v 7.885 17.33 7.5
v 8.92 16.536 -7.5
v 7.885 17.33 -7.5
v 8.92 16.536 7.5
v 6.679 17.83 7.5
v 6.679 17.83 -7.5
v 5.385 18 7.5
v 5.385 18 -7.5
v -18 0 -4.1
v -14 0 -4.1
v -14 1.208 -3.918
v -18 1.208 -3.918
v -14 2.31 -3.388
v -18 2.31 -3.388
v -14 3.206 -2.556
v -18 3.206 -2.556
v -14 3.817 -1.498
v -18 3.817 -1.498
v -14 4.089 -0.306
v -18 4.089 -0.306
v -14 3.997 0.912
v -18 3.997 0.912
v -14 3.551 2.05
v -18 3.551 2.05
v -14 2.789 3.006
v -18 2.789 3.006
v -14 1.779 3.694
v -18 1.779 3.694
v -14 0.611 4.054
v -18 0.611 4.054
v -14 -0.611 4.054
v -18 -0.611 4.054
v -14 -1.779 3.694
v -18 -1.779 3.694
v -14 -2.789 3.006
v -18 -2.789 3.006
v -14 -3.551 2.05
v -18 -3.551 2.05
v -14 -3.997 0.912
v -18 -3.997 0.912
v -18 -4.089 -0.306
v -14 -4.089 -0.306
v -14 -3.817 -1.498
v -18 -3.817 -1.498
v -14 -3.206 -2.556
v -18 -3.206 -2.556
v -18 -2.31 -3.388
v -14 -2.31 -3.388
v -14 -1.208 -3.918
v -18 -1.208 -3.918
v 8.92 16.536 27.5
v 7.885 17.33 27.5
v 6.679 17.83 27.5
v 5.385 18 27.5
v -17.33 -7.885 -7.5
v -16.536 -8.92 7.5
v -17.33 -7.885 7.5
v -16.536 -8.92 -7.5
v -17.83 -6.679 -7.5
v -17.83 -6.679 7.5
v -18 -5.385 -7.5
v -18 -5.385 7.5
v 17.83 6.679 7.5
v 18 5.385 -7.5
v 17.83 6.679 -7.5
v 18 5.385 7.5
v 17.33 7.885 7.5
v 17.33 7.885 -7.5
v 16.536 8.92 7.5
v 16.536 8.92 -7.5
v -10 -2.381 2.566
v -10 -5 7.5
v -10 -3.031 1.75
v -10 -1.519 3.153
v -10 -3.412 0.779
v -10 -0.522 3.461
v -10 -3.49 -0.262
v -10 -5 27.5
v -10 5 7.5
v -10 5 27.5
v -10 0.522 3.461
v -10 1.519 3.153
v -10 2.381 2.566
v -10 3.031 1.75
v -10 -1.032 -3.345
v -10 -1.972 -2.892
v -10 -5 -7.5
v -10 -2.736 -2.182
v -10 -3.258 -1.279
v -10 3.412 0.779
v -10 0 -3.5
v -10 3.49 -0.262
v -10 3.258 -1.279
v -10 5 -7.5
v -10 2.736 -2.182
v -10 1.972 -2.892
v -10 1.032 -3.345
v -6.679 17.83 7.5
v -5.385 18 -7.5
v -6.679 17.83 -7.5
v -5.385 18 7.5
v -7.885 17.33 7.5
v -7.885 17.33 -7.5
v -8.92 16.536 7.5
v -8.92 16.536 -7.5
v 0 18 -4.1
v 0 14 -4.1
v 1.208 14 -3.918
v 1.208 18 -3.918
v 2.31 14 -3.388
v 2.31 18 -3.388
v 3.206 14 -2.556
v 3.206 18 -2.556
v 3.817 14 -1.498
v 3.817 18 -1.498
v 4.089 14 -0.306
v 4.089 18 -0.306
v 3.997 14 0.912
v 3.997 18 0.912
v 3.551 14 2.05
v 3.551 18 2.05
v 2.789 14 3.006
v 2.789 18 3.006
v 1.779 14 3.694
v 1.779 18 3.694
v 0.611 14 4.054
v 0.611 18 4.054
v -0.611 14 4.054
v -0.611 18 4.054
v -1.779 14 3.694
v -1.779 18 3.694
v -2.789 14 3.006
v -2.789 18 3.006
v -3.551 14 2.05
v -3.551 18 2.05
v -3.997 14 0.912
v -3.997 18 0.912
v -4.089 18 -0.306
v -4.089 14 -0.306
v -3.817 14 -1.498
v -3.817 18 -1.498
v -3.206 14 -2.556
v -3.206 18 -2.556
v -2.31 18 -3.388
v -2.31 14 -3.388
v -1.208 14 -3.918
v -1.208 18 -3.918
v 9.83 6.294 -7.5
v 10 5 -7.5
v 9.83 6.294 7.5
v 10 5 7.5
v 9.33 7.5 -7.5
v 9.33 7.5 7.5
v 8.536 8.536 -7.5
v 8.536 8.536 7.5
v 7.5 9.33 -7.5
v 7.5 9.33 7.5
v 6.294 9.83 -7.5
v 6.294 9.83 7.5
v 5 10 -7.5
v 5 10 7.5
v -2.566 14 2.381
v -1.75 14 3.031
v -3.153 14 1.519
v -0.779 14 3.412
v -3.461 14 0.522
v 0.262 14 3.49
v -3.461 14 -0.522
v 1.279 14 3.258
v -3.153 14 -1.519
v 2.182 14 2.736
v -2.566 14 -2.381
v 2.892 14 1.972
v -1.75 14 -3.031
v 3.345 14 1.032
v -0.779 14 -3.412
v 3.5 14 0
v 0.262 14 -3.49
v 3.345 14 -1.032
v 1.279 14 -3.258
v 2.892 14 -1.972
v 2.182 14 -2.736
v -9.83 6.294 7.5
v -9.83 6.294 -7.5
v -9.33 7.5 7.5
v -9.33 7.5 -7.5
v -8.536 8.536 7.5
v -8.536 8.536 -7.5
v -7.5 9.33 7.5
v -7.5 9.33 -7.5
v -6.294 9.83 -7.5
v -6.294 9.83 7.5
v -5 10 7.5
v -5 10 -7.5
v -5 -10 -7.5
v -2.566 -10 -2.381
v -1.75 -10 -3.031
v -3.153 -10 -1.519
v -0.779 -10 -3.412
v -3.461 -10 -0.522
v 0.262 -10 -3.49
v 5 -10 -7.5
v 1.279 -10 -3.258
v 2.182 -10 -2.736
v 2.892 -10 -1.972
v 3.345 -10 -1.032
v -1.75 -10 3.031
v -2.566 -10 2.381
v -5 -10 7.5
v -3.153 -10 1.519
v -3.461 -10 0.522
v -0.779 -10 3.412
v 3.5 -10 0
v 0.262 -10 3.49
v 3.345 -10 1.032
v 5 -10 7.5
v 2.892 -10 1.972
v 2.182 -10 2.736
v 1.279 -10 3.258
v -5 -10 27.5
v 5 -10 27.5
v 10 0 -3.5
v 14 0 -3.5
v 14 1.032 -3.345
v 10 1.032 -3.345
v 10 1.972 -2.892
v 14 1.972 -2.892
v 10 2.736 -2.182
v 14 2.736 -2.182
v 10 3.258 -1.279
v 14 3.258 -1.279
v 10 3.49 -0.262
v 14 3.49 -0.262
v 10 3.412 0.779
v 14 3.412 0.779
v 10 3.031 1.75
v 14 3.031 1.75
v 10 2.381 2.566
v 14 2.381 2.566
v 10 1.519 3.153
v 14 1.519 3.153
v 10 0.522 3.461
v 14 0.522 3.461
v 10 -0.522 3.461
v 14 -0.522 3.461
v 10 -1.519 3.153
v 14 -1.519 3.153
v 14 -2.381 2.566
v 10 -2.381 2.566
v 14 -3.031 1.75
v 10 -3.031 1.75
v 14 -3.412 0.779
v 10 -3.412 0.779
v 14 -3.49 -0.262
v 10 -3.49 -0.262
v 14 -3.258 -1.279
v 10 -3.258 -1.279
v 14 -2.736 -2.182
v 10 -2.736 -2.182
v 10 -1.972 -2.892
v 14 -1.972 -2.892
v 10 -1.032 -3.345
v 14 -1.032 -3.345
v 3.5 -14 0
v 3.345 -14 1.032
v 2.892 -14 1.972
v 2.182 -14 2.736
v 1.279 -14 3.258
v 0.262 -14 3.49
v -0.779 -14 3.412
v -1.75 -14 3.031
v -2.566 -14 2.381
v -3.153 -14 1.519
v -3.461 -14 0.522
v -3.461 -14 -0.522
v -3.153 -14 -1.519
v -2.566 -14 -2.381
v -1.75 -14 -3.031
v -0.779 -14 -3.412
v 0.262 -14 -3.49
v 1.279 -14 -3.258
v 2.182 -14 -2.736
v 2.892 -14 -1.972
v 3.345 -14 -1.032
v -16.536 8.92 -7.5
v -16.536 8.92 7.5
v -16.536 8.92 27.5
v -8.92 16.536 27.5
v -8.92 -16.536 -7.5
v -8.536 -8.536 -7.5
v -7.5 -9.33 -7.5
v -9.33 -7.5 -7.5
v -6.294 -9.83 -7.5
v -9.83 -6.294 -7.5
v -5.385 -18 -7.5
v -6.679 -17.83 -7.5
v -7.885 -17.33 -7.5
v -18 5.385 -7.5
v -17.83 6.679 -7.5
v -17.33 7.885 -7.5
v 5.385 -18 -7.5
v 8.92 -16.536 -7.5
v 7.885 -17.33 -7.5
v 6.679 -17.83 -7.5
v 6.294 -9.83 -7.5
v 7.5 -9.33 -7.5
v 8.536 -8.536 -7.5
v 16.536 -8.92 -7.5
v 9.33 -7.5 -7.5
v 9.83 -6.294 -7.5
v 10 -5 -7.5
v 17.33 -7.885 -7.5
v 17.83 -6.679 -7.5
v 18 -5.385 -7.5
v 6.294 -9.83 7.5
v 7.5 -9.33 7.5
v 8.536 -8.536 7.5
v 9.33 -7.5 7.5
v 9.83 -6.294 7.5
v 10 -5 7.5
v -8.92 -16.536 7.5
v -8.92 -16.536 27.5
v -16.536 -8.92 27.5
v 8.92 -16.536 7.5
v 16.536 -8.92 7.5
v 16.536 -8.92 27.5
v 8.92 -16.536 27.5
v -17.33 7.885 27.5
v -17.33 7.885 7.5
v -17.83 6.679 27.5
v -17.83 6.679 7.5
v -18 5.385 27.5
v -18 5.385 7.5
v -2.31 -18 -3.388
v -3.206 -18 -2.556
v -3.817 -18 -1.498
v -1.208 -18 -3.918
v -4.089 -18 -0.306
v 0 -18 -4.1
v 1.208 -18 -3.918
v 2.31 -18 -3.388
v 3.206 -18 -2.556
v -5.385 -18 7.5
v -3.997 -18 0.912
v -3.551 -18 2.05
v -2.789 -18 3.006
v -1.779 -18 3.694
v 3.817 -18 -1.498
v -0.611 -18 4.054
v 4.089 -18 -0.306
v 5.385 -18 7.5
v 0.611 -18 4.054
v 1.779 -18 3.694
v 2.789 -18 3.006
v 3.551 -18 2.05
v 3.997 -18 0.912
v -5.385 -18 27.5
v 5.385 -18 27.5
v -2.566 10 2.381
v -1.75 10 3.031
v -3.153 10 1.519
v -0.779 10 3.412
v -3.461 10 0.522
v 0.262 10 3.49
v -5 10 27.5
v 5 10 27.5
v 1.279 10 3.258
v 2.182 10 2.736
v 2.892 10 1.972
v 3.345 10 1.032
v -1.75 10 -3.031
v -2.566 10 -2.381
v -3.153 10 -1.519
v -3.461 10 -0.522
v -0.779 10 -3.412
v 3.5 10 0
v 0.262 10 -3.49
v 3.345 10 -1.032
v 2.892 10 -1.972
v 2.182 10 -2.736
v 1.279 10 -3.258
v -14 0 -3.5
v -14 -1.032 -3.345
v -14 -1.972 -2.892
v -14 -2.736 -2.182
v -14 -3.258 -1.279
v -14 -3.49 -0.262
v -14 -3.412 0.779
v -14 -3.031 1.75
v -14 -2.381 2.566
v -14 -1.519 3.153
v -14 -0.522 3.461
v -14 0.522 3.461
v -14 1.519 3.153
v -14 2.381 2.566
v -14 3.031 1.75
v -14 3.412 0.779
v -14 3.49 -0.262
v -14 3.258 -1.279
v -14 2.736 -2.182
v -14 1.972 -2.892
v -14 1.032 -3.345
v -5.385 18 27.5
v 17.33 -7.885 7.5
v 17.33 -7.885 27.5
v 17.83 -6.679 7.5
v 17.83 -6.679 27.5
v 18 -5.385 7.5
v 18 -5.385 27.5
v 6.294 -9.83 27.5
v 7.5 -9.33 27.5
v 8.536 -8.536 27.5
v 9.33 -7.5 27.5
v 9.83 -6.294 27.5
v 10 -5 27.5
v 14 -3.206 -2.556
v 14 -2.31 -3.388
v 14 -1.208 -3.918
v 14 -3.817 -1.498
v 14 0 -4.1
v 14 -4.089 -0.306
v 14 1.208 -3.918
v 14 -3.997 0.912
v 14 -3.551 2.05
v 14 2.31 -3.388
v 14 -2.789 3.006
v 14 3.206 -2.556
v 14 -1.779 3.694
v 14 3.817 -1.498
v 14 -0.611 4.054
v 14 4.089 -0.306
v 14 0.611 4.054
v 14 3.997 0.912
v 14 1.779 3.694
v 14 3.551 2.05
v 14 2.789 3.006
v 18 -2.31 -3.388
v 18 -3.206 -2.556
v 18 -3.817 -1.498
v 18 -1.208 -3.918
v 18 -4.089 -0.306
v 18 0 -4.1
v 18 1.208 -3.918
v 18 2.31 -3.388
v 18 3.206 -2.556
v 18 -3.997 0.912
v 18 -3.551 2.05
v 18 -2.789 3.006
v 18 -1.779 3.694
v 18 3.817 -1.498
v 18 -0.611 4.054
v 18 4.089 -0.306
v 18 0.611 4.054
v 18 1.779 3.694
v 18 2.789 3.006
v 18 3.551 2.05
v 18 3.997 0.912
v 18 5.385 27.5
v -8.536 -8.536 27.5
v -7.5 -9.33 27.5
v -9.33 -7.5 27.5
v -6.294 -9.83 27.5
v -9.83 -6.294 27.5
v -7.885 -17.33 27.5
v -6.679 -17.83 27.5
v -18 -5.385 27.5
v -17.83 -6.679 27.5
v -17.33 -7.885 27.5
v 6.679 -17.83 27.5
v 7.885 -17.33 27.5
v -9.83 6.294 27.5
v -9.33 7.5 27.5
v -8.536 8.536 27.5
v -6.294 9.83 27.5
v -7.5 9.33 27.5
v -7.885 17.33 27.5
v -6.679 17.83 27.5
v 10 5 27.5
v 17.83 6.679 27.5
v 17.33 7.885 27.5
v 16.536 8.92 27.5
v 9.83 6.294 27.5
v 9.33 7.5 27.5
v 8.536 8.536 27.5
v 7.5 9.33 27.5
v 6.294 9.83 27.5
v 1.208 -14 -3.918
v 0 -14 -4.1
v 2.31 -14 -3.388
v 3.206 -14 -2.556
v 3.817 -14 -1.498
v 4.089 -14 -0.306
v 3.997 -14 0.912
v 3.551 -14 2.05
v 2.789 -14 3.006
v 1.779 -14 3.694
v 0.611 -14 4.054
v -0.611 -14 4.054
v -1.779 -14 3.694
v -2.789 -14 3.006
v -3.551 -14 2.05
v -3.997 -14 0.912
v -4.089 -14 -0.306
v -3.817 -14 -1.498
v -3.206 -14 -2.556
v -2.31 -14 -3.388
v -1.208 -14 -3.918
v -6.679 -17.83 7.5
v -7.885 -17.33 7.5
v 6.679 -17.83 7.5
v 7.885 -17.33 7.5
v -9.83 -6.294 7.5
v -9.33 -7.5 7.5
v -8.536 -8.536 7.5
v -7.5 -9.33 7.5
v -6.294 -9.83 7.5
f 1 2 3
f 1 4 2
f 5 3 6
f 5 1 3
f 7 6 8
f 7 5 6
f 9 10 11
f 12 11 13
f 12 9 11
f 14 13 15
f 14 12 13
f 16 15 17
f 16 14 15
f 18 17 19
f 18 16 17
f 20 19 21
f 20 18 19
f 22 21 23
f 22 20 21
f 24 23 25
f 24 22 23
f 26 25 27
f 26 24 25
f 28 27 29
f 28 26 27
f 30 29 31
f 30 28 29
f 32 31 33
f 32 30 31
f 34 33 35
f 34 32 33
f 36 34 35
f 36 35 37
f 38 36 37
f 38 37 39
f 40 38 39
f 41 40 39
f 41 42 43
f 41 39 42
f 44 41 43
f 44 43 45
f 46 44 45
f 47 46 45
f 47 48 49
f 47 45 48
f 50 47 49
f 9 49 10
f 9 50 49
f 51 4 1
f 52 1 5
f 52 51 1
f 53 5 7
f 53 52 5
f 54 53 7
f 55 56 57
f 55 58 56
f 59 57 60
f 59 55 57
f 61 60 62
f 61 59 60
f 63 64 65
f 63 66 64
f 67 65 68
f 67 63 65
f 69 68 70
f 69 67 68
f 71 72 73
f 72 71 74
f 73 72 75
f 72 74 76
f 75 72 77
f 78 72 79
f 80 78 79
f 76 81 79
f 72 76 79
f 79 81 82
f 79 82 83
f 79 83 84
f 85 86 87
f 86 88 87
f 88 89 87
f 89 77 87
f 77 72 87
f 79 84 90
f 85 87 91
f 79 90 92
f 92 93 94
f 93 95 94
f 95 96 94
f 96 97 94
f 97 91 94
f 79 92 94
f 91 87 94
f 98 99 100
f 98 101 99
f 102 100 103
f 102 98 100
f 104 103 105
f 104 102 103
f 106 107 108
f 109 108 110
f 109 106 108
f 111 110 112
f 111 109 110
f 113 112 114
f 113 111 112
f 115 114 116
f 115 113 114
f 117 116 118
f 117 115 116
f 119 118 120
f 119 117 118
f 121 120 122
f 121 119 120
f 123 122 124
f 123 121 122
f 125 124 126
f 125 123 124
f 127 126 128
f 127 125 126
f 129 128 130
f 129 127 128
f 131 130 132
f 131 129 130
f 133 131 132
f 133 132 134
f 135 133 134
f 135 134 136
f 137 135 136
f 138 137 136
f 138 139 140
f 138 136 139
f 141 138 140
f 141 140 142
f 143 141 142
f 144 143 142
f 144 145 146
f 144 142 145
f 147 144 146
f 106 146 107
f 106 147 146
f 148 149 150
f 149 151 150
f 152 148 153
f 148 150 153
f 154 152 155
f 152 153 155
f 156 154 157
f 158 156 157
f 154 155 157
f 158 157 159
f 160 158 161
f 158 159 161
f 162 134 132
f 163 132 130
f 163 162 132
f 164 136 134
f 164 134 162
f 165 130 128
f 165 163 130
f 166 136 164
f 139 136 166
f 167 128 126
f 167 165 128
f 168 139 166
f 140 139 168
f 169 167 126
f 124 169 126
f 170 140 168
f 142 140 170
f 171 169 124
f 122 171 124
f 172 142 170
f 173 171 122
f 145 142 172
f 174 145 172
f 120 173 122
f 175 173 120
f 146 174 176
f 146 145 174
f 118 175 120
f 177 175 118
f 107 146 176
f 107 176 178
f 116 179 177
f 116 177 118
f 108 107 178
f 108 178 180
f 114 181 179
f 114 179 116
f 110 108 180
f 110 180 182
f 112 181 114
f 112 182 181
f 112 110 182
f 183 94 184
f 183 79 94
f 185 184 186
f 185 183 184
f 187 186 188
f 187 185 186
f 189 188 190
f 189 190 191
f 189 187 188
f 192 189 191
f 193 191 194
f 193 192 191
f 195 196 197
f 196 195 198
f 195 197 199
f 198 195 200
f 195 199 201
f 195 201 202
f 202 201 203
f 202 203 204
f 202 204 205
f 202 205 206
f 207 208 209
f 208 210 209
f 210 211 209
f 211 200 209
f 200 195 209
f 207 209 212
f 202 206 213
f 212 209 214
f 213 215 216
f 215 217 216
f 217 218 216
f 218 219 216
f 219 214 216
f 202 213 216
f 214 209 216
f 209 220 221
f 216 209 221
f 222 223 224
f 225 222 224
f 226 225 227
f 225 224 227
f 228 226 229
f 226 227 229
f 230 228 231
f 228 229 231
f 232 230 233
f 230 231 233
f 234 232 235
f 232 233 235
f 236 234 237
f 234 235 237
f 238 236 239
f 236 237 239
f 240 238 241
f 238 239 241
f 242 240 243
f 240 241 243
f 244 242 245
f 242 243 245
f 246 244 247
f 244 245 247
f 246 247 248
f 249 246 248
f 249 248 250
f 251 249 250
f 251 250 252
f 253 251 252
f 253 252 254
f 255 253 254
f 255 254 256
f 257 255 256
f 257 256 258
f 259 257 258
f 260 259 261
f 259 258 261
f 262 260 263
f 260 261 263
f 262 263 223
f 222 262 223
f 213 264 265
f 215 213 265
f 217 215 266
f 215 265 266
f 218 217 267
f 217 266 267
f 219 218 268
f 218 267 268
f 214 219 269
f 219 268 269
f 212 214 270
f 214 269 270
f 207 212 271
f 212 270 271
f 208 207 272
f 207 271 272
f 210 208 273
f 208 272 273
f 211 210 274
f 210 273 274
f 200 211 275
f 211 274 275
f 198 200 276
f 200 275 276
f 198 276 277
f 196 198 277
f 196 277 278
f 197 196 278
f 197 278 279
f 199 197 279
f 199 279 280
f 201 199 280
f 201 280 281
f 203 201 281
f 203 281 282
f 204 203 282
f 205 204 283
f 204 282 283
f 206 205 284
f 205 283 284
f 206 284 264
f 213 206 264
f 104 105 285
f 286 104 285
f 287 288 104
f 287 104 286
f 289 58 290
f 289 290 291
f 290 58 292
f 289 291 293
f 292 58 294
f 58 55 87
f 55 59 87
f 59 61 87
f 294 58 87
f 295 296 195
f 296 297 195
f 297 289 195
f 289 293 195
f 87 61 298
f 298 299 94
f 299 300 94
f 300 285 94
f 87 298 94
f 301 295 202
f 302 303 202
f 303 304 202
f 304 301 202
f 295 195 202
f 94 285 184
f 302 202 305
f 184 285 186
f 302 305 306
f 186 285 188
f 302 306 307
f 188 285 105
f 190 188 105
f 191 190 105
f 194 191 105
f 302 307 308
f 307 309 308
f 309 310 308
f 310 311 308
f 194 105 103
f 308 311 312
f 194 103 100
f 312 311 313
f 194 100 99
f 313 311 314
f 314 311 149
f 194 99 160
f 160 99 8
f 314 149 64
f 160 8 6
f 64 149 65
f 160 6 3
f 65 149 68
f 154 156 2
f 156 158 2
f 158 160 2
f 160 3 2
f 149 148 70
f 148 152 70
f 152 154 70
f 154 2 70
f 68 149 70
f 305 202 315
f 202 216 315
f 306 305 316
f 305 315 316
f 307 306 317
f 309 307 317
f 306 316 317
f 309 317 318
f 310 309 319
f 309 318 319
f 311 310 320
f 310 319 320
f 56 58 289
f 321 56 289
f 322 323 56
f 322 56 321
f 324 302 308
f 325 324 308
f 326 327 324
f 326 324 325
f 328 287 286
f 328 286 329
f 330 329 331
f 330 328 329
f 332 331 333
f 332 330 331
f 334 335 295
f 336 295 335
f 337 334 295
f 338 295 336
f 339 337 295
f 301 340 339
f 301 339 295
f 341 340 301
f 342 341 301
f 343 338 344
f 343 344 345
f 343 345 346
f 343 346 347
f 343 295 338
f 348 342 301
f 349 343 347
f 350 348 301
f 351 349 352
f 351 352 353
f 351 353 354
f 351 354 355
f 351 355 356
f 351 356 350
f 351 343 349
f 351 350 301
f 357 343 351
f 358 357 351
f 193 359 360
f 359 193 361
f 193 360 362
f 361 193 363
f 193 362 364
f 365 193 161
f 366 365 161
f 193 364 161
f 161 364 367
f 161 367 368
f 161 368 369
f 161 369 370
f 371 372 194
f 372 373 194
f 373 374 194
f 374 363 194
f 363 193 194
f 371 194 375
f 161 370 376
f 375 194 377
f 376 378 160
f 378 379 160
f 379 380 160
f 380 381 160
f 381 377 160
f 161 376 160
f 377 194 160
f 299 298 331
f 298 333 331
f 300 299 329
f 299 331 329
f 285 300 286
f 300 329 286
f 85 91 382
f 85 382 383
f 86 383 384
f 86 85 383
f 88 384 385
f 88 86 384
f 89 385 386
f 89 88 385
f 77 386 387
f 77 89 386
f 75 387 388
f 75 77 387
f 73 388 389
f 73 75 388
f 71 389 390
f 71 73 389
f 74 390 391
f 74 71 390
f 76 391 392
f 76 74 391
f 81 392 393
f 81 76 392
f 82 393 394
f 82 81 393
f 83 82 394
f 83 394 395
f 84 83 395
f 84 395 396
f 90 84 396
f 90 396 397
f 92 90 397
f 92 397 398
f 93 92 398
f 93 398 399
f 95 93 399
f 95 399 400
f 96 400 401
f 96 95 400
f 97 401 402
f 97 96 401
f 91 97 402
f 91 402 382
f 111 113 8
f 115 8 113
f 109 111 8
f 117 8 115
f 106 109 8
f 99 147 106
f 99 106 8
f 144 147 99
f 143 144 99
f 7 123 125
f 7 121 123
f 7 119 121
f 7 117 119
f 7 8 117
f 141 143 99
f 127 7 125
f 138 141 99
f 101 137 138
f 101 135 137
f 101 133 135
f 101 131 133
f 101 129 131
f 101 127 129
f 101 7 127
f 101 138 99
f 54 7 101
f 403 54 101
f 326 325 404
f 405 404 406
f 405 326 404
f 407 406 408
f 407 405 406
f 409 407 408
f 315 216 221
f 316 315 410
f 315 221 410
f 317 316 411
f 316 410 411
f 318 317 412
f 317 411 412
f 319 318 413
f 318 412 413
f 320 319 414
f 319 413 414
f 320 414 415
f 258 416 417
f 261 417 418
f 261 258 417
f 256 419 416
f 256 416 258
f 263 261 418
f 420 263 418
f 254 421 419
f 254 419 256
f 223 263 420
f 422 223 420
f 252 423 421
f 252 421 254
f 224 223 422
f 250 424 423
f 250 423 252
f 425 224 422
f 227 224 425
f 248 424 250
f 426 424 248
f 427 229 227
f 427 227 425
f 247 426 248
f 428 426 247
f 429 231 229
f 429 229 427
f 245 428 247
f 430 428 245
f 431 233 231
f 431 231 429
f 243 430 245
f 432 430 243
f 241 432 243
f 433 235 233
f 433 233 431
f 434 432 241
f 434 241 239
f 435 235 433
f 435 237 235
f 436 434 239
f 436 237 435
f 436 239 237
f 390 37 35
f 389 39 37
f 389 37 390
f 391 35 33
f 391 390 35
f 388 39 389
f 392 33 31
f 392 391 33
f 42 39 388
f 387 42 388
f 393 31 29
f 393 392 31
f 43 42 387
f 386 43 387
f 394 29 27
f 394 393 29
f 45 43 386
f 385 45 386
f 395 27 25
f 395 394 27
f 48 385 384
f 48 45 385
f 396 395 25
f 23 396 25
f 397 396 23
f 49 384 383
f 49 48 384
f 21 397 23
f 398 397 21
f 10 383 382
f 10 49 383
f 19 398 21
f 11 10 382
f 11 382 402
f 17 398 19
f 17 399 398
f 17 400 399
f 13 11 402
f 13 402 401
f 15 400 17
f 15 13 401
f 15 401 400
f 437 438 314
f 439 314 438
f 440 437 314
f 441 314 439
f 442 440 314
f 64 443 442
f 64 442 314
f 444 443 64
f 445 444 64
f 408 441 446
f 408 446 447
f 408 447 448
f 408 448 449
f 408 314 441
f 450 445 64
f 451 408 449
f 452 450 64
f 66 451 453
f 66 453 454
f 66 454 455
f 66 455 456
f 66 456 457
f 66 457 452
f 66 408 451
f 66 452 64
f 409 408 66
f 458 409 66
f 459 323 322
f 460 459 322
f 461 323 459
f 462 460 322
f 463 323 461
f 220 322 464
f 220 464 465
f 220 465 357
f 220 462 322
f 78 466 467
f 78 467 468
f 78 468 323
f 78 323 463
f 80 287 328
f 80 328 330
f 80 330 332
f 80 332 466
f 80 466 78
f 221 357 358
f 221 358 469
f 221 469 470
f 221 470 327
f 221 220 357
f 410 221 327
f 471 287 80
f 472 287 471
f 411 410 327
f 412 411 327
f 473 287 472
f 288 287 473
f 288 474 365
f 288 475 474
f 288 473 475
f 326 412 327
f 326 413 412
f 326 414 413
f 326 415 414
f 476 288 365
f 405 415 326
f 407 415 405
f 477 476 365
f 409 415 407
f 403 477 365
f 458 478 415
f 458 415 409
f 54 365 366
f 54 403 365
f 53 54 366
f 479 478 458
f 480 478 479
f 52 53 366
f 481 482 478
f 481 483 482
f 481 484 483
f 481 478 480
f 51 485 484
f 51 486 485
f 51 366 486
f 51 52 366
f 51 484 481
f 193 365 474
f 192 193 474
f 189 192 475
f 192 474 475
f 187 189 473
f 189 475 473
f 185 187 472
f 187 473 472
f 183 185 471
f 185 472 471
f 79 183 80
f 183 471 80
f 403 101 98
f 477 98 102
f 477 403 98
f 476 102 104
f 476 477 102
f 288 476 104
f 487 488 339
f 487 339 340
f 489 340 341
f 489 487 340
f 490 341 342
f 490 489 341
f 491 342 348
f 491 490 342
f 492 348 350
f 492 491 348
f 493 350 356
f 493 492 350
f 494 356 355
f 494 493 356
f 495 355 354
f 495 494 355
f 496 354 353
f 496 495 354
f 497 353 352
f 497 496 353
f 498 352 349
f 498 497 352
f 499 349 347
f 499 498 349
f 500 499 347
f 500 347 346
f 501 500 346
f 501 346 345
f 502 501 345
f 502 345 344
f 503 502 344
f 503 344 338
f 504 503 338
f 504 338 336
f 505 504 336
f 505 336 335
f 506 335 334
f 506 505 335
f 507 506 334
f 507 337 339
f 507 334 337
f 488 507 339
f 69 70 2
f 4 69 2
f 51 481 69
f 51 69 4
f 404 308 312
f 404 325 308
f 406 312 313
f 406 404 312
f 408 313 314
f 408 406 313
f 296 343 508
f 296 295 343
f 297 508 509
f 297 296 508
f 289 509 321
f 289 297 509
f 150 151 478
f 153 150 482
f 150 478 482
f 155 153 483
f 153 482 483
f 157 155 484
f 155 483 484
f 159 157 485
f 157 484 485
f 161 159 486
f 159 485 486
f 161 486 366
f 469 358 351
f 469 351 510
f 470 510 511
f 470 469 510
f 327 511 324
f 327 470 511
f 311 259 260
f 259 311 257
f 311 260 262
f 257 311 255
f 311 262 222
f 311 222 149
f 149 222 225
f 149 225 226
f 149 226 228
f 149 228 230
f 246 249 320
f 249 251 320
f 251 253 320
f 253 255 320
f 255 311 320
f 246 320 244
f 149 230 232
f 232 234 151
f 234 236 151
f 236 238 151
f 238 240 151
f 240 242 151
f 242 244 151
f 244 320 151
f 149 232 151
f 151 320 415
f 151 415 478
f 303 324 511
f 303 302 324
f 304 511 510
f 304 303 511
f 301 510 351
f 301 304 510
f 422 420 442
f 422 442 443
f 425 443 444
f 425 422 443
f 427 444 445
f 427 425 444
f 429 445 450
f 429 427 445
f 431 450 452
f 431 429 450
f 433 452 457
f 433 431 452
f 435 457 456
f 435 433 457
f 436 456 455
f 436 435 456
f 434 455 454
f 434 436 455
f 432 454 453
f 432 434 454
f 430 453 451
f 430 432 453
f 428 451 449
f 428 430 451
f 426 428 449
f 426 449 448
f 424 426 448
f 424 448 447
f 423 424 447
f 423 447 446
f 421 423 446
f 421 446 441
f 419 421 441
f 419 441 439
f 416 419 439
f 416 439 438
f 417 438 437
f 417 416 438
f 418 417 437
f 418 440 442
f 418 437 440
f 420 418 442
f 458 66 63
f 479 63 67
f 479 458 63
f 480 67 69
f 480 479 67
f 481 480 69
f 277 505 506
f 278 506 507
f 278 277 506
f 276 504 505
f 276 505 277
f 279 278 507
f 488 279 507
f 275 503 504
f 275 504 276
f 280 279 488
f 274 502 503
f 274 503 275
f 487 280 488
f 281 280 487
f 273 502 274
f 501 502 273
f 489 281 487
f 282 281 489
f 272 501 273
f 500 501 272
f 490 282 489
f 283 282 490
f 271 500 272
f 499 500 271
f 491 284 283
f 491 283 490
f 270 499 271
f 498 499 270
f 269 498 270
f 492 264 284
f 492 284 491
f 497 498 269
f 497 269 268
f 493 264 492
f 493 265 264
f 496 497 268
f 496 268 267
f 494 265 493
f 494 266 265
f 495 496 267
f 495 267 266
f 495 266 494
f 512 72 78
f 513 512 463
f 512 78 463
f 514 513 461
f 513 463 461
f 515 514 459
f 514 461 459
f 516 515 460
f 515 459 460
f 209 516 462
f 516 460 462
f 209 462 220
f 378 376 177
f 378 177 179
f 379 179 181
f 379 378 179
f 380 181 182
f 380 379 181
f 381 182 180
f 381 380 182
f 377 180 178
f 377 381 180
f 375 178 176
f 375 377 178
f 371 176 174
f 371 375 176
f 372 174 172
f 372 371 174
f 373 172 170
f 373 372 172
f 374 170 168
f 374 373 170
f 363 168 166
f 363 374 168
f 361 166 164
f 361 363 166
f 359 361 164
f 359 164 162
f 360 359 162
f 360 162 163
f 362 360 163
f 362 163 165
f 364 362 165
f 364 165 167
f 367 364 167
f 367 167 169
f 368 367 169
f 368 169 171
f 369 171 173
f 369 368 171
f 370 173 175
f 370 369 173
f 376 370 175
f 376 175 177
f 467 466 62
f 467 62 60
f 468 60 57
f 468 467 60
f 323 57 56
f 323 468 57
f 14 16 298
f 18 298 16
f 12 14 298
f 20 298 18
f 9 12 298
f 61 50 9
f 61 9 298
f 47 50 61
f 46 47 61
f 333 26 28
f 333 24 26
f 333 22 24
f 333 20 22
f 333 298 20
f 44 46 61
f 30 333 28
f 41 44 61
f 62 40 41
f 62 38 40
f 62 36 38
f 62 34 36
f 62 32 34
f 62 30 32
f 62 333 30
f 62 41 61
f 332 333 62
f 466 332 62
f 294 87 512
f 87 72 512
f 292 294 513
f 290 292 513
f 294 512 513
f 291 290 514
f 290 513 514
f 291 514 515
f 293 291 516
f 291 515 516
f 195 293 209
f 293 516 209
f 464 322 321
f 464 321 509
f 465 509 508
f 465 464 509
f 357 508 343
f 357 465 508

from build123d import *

# Parameters (mm, degrees)
EXTRUDE_1_DEPTH          = 7.5
CUT_EXTRUDE_1_DEPTH      = 30.546573405
CUT_EXTRUDE_1_DEPTH_BACK = 30.546573405
SKETCH_2_W               = 20
SKETCH_2_H               = 20
FILLET_1_R               = 5
FILLET_2_R               = 5
CUT_EXTRUDE_2_DEPTH      = 41.942032192
CUT_EXTRUDE_2_DEPTH_BACK = 41.942032192
SKETCH_3_R               = 4.1
CUT_EXTRUDE_3_DEPTH      = 41.942032192
CUT_EXTRUDE_3_DEPTH_BACK = 41.942032192
SKETCH_4_R               = 4.1
EXTRUDE_START            = 20
EXTRUDE_2_DEPTH          = 20
EXTRUDE_START_2          = -4
SKETCH_6_R               = 4.1
SKETCH_6_R_2             = 3.5
EXTRUDE_3_DEPTH          = 4
SKETCH_7_R               = 4.1
SKETCH_7_R_2             = 3.5
EXTRUDE_4_DEPTH          = 4
EXTRUDE_START_3          = -8
SKETCH_8_R               = 4.1
SKETCH_8_R_2             = 3.5
EXTRUDE_5_DEPTH          = 4
SKETCH_9_R               = 4.1
SKETCH_9_R_2             = 3.5
EXTRUDE_6_DEPTH          = 4


with BuildPart() as part:
    # ｽｹｯﾁ1 → ﾎﾞｽ - 押し出し1 (new, symmetric)
    with BuildSketch(Plane.XY):
        Polygon((7.455844123, -18), (18, -7.455844123), (18, 7.455844123), (7.455844123, 18), (-7.455844123, 18), (-18, 7.455844123), (-18, -7.455844123), (-7.455844123, -18), align=None)
    extrude(amount=EXTRUDE_1_DEPTH, both=True)

    # ｽｹｯﾁ2 → ｶｯﾄ - 押し出し1 (cut, two sides: drawn at the far end of the back side and taken through both)
    with BuildSketch(Plane.XY.offset(7.5).offset(-CUT_EXTRUDE_1_DEPTH_BACK)):
        Rectangle(SKETCH_2_W, SKETCH_2_H)
    extrude(amount=CUT_EXTRUDE_1_DEPTH + CUT_EXTRUDE_1_DEPTH_BACK, mode=Mode.SUBTRACT)

    # ﾌｨﾚｯﾄ1
    fillet_1_edges = [part.edges().sort_by_distance(p)[0] for p in [
        (-10, -10, 0),
        (-10, 10, 0),
        (10, 10, 0),
        (10, -10, 0),
    ]]
    fillet(fillet_1_edges, radius=FILLET_1_R)

    # ﾌｨﾚｯﾄ2
    fillet_2_edges = [part.edges().sort_by_distance(p)[0] for p in [
        (-7.455844123, 18, 0),
        (7.455844123, 18, 0),
        (18, 7.455844123, 0),
        (18, -7.455844123, 0),
        (7.455844123, -18, 0),
        (-7.455844123, -18, 0),
        (-18, -7.455844123, 0),
        (-18, 7.455844123, 0),
    ]]
    fillet(fillet_2_edges, radius=FILLET_2_R)

    # ｽｹｯﾁ3 → ｶｯﾄ - 押し出し2 (cut, two sides: drawn at the far end of the back side and taken through both)
    with BuildSketch(Plane.XZ.offset(18).offset(-CUT_EXTRUDE_2_DEPTH_BACK)):
        with Locations(Location((0, 0, 0), (0, 0, 270))):
            Circle(SKETCH_3_R)
    extrude(amount=CUT_EXTRUDE_2_DEPTH + CUT_EXTRUDE_2_DEPTH_BACK, mode=Mode.SUBTRACT)

    # ｽｹｯﾁ4 → ｶｯﾄ - 押し出し3 (cut, two sides: drawn at the far end of the back side and taken through both)
    with BuildSketch(Plane(origin=(18, 0, 0), x_dir=(0, 0, -1), z_dir=(1, 0, 0)).offset(-CUT_EXTRUDE_3_DEPTH_BACK)):
        Circle(SKETCH_4_R)
    extrude(amount=CUT_EXTRUDE_3_DEPTH + CUT_EXTRUDE_3_DEPTH_BACK, mode=Mode.SUBTRACT)

    # ｽｹｯﾁ5 → ﾎﾞｽ - 押し出し2 (add)
    with BuildSketch(Plane.XY.offset(7.5).offset(EXTRUDE_START)):
        with BuildLine():
            Line((8.920310217, -16.535533906), (16.535533906, -8.920310217))
            ThreePointArc((16.535533906, -8.920310217), (17.619397663, -7.298193473), (18, -5.384776311))
            Line((18, -5.384776311), (18, 5.384776311))
            ThreePointArc((18, 5.384776311), (17.619397663, 7.298193473), (16.535533906, 8.920310217))
            Line((16.535533906, 8.920310217), (8.920310217, 16.535533906))
            ThreePointArc((8.920310217, 16.535533906), (7.298193473, 17.619397663), (5.384776311, 18))
            Line((5.384776311, 18), (-5.384776311, 18))
            ThreePointArc((-5.384776311, 18), (-7.298193473, 17.619397663), (-8.920310217, 16.535533906))
            Line((-8.920310217, 16.535533906), (-16.535533906, 8.920310217))
            ThreePointArc((-16.535533906, 8.920310217), (-17.619397663, 7.298193473), (-18, 5.384776311))
            Line((-18, 5.384776311), (-18, -5.384776311))
            ThreePointArc((-18, -5.384776311), (-17.619397663, -7.298193473), (-16.535533906, -8.920310217))
            Line((-16.535533906, -8.920310217), (-8.920310217, -16.535533906))
            ThreePointArc((-8.920310217, -16.535533906), (-7.298193473, -17.619397663), (-5.384776311, -18))
            Line((-5.384776311, -18), (5.384776311, -18))
            ThreePointArc((5.384776311, -18), (7.298193473, -17.619397663), (8.920310217, -16.535533906))
        make_face()
        with BuildLine():
            Line((5, 10), (-5, 10))
            ThreePointArc((-5, 10), (-8.535533906, 8.535533906), (-10, 5))
            Line((-10, 5), (-10, -5))
            ThreePointArc((-10, -5), (-8.535533906, -8.535533906), (-5, -10))
            Line((-5, -10), (5, -10))
            ThreePointArc((5, -10), (8.535533906, -8.535533906), (10, -5))
            Line((10, -5), (10, 5))
            ThreePointArc((10, 5), (8.535533906, 8.535533906), (5, 10))
        make_face(mode=Mode.SUBTRACT)
    extrude(amount=-EXTRUDE_2_DEPTH)

    # ｽｹｯﾁ6 → ﾎﾞｽ - 押し出し3 (add)
    with BuildSketch(Plane.XZ.offset(18).offset(EXTRUDE_START_2)):
        Circle(SKETCH_6_R)
        Circle(SKETCH_6_R_2, mode=Mode.SUBTRACT)
    extrude(amount=-EXTRUDE_3_DEPTH)

    # ｽｹｯﾁ7 → ﾎﾞｽ - 押し出し4 (add)
    with BuildSketch(Plane(origin=(18, 0, 0), x_dir=(0, 0, -1), z_dir=(1, 0, 0)).offset(EXTRUDE_START_2)):
        with Locations(Location((0, 0, 0), (0, 0, 90))):
            Circle(SKETCH_7_R)
        Circle(SKETCH_7_R_2, mode=Mode.SUBTRACT)
    extrude(amount=-EXTRUDE_4_DEPTH)

    # ｽｹｯﾁ8 → ﾎﾞｽ - 押し出し5 (add)
    with BuildSketch(Plane(origin=(0, 18, 0), x_dir=(1, 0, 0), z_dir=(0, 1, 0)).offset(EXTRUDE_START_3)):
        Circle(SKETCH_8_R)
        Circle(SKETCH_8_R_2, mode=Mode.SUBTRACT)
    extrude(amount=EXTRUDE_5_DEPTH)

    # ｽｹｯﾁ9 → ﾎﾞｽ - 押し出し6 (add)
    with BuildSketch(Plane.ZY.offset(18).offset(EXTRUDE_START_3)):
        with Locations(Location((0, 0, 0), (0, 0, 90))):
            Circle(SKETCH_9_R)
        with Locations(Location((0, 0, 0), (0, 0, 180))):
            Circle(SKETCH_9_R_2, mode=Mode.SUBTRACT)
    extrude(amount=EXTRUDE_6_DEPTH)


solid = part.part
